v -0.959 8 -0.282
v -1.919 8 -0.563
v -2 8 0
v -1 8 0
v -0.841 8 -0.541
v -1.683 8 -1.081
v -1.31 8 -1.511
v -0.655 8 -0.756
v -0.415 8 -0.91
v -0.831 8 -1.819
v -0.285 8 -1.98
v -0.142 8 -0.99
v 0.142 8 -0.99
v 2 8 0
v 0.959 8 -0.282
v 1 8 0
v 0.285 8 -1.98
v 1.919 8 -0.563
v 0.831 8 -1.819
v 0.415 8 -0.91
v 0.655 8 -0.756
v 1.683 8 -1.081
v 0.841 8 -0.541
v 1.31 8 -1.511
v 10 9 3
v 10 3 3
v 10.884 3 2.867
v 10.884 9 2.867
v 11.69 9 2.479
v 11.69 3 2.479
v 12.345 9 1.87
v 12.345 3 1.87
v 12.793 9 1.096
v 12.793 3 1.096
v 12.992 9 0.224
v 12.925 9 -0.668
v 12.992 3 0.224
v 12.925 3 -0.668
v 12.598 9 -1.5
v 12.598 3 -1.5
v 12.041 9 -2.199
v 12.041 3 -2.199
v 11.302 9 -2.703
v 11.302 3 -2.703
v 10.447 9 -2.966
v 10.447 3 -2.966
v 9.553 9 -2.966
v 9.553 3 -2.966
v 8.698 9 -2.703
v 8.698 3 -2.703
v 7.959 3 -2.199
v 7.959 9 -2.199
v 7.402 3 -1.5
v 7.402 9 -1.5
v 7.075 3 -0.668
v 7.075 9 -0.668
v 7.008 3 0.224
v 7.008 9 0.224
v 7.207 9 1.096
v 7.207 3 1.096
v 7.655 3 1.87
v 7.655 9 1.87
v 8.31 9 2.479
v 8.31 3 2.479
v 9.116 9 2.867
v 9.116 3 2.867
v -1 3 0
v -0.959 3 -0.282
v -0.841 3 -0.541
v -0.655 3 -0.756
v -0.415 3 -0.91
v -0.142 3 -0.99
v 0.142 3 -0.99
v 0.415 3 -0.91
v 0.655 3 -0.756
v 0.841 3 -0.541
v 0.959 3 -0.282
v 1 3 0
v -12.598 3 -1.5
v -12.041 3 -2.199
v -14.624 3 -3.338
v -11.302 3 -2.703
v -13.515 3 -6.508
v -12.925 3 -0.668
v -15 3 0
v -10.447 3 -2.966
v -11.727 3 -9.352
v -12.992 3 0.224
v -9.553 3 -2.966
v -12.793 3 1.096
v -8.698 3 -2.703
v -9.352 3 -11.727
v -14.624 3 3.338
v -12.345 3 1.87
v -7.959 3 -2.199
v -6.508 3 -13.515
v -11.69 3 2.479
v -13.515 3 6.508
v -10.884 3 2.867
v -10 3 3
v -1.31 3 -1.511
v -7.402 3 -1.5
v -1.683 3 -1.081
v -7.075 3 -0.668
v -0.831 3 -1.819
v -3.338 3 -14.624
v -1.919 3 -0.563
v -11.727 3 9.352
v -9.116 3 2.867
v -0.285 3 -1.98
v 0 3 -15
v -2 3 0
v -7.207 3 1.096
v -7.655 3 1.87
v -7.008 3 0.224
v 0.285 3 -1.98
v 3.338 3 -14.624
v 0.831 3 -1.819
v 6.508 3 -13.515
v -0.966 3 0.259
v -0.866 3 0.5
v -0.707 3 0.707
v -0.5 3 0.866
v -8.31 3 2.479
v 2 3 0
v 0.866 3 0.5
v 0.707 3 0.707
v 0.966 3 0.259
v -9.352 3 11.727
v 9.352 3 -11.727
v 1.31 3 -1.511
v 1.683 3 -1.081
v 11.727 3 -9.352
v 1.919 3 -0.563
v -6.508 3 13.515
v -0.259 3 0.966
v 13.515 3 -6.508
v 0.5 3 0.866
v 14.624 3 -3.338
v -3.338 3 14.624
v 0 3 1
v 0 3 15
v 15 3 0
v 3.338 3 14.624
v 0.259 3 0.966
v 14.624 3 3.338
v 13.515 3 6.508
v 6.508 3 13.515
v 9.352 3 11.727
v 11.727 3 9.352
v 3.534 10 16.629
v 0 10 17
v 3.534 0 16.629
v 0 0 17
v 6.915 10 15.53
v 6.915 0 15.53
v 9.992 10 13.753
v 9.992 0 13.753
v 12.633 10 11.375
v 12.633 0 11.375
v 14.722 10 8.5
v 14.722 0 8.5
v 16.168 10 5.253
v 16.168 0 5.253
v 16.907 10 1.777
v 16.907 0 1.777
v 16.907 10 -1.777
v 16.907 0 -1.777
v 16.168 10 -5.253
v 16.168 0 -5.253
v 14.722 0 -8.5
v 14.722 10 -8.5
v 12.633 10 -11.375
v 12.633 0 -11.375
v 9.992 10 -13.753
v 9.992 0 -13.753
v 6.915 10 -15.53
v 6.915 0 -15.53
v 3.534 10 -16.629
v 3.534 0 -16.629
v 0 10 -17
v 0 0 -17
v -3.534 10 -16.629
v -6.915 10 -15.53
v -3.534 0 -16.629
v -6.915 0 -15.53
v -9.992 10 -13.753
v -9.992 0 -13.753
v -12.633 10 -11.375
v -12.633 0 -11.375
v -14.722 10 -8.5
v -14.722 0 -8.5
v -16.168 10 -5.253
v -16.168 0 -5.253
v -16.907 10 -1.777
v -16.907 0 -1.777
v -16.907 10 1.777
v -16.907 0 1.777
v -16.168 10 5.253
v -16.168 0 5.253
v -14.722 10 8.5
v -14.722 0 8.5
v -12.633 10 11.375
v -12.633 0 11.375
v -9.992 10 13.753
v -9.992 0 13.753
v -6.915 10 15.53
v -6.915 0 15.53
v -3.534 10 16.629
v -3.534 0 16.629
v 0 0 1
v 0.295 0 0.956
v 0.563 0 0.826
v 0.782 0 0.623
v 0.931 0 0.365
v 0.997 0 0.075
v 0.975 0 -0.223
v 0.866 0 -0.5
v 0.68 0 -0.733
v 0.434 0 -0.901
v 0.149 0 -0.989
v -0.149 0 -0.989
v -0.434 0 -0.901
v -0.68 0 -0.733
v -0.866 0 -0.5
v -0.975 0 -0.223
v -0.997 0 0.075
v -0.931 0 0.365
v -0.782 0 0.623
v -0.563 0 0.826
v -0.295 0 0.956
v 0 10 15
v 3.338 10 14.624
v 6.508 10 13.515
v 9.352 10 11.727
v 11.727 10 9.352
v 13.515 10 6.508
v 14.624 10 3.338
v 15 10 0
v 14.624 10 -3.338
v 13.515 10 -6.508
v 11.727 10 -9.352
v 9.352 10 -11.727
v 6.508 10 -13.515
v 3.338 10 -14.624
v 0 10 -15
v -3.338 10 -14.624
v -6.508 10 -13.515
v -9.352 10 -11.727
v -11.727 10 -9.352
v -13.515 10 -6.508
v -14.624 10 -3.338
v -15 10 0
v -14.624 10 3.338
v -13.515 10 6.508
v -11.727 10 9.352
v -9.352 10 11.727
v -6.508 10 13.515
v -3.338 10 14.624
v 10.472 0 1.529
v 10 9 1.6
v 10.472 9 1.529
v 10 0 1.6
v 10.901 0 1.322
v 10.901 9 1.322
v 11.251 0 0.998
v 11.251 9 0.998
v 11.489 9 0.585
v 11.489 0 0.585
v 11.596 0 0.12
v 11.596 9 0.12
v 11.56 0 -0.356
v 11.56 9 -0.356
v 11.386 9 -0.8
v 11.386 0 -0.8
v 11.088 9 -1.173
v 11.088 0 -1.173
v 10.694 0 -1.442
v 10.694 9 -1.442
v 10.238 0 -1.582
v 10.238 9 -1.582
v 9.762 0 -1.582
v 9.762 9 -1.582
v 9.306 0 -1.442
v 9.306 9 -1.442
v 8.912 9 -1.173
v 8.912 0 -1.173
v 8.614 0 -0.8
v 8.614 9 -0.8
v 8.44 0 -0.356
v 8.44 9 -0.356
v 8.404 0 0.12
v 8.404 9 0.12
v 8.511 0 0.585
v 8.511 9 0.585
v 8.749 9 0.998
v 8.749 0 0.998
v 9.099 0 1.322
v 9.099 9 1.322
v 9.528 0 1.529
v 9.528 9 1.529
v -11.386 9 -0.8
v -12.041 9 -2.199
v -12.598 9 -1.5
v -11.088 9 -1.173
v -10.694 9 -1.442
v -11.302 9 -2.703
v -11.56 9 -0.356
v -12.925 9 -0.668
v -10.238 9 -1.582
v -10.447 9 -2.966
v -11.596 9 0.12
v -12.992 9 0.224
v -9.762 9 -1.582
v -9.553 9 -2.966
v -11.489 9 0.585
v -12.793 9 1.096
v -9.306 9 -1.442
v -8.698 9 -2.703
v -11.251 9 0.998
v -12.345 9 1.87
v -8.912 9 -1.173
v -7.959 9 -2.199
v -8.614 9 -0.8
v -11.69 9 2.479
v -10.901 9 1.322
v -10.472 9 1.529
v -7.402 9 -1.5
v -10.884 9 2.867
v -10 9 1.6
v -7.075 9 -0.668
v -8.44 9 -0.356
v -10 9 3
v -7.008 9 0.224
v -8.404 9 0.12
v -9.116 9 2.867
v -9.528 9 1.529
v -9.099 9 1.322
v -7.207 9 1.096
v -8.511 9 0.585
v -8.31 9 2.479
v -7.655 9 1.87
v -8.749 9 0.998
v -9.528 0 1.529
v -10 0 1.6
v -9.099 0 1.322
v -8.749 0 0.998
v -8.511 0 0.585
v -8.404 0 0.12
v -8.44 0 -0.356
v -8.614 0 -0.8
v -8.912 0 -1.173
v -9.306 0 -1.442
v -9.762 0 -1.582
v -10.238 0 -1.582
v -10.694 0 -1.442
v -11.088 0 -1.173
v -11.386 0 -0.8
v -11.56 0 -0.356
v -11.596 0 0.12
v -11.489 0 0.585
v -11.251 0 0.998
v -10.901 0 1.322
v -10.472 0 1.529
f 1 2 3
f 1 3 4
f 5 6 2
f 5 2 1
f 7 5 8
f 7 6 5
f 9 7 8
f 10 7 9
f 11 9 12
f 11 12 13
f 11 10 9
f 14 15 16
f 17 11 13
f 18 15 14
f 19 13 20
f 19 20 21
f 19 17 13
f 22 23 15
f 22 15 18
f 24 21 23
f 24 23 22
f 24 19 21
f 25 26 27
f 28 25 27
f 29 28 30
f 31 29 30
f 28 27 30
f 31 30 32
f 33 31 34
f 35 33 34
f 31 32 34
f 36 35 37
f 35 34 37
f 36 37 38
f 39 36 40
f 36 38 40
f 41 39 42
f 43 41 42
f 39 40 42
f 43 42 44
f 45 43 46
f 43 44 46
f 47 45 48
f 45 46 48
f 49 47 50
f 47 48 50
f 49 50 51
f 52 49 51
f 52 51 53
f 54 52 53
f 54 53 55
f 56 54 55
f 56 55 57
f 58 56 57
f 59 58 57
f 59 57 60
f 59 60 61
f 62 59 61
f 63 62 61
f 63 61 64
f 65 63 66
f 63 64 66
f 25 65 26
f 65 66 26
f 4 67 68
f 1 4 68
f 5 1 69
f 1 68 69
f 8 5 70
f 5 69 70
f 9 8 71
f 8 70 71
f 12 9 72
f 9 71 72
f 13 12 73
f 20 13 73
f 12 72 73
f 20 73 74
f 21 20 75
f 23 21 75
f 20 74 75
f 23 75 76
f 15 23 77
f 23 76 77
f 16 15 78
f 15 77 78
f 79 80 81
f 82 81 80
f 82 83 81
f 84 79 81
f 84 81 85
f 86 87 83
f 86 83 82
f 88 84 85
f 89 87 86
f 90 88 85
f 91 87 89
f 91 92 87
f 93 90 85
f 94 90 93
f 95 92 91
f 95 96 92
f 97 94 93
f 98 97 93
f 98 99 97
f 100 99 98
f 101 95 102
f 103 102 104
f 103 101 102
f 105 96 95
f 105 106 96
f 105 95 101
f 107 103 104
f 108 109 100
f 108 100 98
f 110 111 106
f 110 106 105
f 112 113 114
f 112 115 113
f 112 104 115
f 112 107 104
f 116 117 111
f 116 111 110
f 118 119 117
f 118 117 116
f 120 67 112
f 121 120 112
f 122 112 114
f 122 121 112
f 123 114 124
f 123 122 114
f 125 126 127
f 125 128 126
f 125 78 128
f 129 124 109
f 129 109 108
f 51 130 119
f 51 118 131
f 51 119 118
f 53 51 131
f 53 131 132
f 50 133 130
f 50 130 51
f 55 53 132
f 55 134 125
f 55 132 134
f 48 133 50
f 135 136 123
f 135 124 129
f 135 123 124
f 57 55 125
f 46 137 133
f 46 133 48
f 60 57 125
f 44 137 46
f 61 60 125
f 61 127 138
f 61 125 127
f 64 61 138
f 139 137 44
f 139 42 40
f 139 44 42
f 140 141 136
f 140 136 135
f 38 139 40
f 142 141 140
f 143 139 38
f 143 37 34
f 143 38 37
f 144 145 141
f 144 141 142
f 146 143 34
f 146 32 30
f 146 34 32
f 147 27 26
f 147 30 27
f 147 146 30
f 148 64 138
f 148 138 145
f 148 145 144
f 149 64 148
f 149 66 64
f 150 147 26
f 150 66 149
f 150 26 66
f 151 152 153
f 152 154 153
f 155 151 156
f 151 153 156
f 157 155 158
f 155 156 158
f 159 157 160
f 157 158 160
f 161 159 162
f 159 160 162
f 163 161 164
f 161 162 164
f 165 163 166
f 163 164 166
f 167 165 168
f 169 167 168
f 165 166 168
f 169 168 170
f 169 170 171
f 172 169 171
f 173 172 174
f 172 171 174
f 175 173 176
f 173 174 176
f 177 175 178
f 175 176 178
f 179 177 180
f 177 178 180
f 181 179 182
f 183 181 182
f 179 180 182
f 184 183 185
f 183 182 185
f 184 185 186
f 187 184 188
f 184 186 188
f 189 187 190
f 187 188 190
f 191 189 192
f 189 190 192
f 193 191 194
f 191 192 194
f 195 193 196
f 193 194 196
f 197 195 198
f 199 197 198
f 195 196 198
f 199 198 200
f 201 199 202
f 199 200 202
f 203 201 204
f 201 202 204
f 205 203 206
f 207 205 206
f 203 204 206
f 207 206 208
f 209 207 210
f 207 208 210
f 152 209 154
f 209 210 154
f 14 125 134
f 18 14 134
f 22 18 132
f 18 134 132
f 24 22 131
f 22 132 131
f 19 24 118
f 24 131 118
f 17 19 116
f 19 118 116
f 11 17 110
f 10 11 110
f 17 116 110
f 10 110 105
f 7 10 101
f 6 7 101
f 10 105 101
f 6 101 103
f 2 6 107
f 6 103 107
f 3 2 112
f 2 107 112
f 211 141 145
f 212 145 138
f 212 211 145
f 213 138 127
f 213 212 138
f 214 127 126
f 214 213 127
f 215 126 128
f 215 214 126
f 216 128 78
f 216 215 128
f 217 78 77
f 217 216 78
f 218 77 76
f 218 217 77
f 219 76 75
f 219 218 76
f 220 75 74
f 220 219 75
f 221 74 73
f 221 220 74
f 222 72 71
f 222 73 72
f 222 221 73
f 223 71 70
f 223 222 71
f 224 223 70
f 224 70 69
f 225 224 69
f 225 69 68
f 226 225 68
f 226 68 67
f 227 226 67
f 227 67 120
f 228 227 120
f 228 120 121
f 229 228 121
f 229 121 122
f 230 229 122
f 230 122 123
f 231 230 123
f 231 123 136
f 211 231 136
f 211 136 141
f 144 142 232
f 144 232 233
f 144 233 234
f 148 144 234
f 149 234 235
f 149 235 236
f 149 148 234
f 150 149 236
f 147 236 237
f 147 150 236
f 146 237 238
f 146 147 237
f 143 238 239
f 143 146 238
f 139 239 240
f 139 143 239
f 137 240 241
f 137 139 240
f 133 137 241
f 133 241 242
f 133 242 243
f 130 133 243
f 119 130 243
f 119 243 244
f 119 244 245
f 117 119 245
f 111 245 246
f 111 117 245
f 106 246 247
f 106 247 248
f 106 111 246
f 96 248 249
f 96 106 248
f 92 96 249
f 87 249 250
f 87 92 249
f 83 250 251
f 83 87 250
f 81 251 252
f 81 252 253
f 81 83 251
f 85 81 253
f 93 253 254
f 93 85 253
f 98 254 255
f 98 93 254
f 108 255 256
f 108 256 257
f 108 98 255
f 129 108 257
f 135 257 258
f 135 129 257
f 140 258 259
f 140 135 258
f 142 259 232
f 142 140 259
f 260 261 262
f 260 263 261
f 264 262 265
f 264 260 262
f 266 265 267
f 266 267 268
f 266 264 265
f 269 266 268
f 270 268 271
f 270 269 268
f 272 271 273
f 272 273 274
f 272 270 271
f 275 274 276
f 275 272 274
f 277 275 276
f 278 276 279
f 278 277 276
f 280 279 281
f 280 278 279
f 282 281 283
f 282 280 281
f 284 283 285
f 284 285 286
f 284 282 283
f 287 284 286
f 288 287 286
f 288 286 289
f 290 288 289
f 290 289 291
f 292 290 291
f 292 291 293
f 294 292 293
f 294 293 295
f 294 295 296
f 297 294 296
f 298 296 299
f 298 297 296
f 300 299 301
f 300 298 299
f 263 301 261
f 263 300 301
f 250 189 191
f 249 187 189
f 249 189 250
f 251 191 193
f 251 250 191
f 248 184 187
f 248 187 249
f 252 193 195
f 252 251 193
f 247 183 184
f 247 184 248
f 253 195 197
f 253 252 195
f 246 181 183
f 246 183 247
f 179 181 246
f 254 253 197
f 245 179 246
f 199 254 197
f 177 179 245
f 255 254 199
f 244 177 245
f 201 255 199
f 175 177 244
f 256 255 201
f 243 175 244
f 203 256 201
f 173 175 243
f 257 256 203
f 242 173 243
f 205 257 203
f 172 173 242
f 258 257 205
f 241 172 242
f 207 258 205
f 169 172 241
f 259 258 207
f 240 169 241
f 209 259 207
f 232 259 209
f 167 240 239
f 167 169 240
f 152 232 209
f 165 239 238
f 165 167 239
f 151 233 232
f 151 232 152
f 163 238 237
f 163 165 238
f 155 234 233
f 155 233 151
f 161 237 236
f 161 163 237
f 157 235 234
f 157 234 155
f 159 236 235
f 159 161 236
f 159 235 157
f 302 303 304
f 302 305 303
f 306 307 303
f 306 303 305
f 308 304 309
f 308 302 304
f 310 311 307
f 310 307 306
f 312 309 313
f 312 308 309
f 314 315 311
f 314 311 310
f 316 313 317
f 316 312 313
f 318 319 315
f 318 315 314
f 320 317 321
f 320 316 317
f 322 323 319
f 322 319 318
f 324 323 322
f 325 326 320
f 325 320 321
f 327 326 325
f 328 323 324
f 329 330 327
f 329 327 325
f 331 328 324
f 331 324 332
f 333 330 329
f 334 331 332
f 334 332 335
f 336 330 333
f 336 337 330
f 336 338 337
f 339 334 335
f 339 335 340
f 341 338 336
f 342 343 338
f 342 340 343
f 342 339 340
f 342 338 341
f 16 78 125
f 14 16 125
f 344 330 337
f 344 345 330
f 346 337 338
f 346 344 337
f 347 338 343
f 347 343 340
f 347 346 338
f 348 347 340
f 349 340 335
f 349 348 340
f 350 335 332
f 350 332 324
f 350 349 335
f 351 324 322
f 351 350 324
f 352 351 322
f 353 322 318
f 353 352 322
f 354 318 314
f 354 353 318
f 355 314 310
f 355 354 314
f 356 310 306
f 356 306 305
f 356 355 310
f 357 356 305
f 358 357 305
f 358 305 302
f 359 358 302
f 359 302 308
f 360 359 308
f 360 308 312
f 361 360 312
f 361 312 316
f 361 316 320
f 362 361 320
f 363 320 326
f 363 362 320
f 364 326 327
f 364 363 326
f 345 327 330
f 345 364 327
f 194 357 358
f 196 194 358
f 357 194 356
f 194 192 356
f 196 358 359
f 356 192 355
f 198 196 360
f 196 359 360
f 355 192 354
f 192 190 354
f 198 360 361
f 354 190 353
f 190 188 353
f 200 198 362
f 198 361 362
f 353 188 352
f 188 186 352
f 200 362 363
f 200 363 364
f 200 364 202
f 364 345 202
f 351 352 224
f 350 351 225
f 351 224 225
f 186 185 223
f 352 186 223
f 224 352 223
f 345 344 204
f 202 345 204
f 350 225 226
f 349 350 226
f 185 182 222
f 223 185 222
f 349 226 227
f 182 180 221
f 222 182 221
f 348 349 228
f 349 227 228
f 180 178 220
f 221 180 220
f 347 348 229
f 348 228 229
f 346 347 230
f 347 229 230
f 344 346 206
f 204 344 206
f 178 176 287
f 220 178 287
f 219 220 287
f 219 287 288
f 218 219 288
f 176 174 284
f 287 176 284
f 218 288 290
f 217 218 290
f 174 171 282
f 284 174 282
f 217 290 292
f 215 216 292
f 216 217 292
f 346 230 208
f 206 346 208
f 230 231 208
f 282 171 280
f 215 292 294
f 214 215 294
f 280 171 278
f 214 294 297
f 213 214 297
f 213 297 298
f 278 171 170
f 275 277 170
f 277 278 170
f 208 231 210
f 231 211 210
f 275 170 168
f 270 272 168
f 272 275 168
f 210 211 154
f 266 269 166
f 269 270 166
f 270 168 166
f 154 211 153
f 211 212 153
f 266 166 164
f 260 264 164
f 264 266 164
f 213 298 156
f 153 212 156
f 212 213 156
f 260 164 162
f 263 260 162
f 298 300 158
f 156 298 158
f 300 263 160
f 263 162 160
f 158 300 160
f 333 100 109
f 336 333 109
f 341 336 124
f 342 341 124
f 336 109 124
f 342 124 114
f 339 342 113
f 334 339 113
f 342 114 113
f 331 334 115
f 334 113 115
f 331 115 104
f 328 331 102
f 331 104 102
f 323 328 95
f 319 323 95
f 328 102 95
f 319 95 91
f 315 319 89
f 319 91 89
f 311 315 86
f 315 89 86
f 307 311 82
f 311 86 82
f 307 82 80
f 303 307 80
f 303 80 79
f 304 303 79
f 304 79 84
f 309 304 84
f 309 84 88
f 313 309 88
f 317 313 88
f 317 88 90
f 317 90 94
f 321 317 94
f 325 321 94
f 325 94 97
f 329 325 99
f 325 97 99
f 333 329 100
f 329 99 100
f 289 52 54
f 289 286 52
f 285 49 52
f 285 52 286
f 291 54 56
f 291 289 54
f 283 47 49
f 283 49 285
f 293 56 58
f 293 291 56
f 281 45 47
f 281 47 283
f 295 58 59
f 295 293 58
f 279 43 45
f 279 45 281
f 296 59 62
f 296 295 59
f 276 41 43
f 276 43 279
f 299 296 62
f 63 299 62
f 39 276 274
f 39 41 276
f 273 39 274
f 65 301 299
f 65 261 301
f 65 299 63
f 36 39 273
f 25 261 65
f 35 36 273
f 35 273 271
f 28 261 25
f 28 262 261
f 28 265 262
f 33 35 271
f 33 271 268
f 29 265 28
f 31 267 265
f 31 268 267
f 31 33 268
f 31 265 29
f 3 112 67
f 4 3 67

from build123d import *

# Parameters (mm, degrees)
CROQUIS1_R              = 17
CROQUIS1_R_2            = 1
CROQUIS1_R_3            = 1.6
SALIENTE_EXTRUIR1_DEPTH = 3
CROQUIS2_R              = 17
CROQUIS2_R_2            = 15
SALIENTE_EXTRUIR2_DEPTH = 7
CROQUIS3_R              = 3
CROQUIS3_R_2            = 1.6
SALIENTE_EXTRUIR3_DEPTH = 6
SALIENTE_EXTRUIR4_DEPTH = 5


with BuildPart() as part:
    # Croquis1 → Saliente-Extruir1 (new body)
    with BuildSketch(Plane(origin=(0, 0, 0), x_dir=(1, 0, 0), z_dir=(0, 1, 0))):
        with Locations(Location((0, 0, 0), (0, 0, 270))):
            Circle(CROQUIS1_R)
        with Locations(Location((0, 0, 0), (0, 0, 270))):
            Circle(CROQUIS1_R_2, mode=Mode.SUBTRACT)
        with Locations(Location((-10, 0, 0), (0, 0, 270))):
            Circle(CROQUIS1_R_3, mode=Mode.SUBTRACT)
        with Locations(Location((10, 0, 0), (0, 0, 270))):
            Circle(CROQUIS1_R_3, mode=Mode.SUBTRACT)
    extrude(amount=SALIENTE_EXTRUIR1_DEPTH)

    # Croquis2 → Saliente-Extruir2 (add)
    with BuildSketch(Plane(origin=(0, 3, 0), x_dir=(1, 0, 0), z_dir=(0, 1, 0))):
        with Locations(Location((0, 0, 0), (0, 0, 270))):
            Circle(CROQUIS2_R)
        with Locations(Location((0, 0, 0), (0, 0, 270))):
            Circle(CROQUIS2_R_2, mode=Mode.SUBTRACT)
    extrude(amount=SALIENTE_EXTRUIR2_DEPTH)

    # Croquis3 → Saliente-Extruir3 (add)
    # profile 1 of 2: a face of its own
    with BuildSketch(Plane(origin=(0, 3, 0), x_dir=(1, 0, 0), z_dir=(0, 1, 0))):
        with Locations(Location((10, 0, 0), (0, 0, 270))):
            Circle(CROQUIS3_R)
        with Locations(Location((10, 0, 0), (0, 0, 270))):
            Circle(CROQUIS3_R_2, mode=Mode.SUBTRACT)
    # profile 2 of 2: a face of its own
    with BuildSketch(Plane(origin=(0, 3, 0), x_dir=(1, 0, 0), z_dir=(0, 1, 0))):
        with Locations(Location((-10, 0, 0), (0, 0, 270))):
            Circle(CROQUIS3_R)
        with Locations(Location((-10, 0, 0), (0, 0, 270))):
            Circle(CROQUIS3_R_2, mode=Mode.SUBTRACT)
    extrude(amount=SALIENTE_EXTRUIR3_DEPTH)

    # Croquis4 → Saliente-Extruir4 (add)
    with BuildSketch(Plane(origin=(0, 3, 0), x_dir=(1, 0, 0), z_dir=(0, 1, 0))):
        with BuildLine():
            Line((1, 0), (2, 0))
            ThreePointArc((2, 0), (0, 2), (-2, 0))
            Line((-2, 0), (-1, 0))
            ThreePointArc((-1, 0), (0, 1), (1, 0))
        make_face()
    extrude(amount=SALIENTE_EXTRUIR4_DEPTH)


solid = part.part
